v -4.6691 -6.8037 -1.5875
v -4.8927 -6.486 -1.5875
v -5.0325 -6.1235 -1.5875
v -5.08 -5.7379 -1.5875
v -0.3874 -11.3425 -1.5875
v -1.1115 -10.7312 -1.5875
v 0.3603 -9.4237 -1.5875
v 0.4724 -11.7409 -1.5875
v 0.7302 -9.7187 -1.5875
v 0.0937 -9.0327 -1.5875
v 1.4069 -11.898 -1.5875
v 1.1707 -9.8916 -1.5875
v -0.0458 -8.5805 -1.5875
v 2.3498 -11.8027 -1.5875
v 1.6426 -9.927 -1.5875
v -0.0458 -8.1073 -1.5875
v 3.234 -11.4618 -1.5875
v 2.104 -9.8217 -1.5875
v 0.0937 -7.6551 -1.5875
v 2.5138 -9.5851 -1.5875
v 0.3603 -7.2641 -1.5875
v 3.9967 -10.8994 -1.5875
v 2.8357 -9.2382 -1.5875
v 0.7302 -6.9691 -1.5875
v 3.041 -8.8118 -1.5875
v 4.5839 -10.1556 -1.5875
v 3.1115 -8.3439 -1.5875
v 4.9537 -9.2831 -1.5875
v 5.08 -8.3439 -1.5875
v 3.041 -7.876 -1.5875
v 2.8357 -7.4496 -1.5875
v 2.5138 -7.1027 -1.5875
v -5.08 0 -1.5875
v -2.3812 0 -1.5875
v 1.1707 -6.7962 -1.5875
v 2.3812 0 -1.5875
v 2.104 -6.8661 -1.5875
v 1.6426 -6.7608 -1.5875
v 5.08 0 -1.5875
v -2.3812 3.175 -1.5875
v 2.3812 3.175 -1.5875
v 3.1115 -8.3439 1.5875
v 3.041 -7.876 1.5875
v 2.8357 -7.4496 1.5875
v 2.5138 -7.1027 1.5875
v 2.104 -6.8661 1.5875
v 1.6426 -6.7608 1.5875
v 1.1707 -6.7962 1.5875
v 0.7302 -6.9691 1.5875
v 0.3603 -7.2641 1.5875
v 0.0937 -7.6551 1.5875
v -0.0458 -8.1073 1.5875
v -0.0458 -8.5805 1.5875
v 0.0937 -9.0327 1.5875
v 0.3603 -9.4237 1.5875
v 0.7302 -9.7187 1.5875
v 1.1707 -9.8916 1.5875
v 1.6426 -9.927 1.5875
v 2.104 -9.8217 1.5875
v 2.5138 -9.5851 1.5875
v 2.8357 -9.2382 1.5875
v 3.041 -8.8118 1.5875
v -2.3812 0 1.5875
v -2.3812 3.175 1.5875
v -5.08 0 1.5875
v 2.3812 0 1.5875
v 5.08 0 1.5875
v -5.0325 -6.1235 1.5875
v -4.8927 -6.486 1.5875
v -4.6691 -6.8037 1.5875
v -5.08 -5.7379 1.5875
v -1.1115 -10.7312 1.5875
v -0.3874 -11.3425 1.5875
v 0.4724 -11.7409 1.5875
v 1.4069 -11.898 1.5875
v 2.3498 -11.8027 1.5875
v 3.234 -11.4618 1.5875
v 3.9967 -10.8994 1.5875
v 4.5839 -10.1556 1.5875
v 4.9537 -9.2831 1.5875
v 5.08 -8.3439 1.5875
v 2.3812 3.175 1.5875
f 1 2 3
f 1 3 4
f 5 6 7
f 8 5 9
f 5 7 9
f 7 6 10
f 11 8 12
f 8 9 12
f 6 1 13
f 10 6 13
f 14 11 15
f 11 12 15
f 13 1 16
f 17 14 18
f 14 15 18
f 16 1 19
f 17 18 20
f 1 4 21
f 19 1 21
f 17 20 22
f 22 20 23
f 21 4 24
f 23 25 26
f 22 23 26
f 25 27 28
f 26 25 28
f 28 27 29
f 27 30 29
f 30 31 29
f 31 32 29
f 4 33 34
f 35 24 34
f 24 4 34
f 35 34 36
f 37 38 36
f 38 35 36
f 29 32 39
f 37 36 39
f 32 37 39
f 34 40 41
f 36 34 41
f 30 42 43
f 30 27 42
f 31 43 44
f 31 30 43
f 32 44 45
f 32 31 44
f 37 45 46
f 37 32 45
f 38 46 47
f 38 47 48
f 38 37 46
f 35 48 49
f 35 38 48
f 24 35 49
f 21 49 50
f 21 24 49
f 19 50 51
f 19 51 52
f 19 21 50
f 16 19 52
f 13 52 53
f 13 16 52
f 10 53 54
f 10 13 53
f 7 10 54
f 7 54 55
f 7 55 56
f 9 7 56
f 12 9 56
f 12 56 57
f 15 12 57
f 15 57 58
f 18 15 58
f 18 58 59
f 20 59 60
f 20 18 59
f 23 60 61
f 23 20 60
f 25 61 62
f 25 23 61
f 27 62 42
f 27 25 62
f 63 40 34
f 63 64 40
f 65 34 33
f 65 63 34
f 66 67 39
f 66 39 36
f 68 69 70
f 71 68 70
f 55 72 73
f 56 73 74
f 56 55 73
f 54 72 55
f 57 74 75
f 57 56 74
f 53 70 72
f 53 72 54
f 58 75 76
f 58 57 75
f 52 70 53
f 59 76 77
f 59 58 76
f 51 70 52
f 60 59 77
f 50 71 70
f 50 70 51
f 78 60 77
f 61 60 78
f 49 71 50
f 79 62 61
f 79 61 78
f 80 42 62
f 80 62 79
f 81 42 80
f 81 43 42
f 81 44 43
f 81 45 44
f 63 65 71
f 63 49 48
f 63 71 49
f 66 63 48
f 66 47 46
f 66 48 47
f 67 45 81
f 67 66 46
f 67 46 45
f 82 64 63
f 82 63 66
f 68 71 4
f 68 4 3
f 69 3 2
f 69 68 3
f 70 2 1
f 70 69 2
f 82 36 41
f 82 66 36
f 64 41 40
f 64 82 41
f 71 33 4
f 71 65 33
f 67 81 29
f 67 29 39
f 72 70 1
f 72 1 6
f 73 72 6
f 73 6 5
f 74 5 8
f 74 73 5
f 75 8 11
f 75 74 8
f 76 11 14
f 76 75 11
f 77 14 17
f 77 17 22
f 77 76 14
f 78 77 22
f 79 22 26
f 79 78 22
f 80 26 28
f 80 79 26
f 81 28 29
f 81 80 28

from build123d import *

# Parameters (mm, degrees)
SKETCH1_R           = 1.5875
BOSS_EXTRUDE1_DEPTH = 1.5875


with BuildPart() as part:
    # Sketch1 → Boss-Extrude1 (new body, symmetric)
    with BuildSketch(Plane.XY):
        with BuildLine():
            Line((-5.08, 0), (-5.08, -5.737908239))
            ThreePointArc((-5.08, -5.737908239), (-4.973712071, -6.309018604), (-4.669080882, -6.803653836))
            Line((-4.669080882, -6.803653836), (-1.111541176, -10.731170137))
            ThreePointArc((-1.111541176, -10.731170137), (2.803287219, -11.66181504), (5.08, -8.3439))
            Line((5.08, -8.3439), (5.08, 0))
            Line((5.08, 0), (2.38125, 0))
            Line((2.38125, 0), (2.38125, 3.175))
            Line((2.38125, 3.175), (-2.38125, 3.175))
            Line((-2.38125, 3.175), (-2.38125, 0))
            Line((-2.38125, 0), (-5.08, 0))
        make_face()
        with Locations((1.524, -8.3439)):
            Circle(SKETCH1_R, mode=Mode.SUBTRACT)
    extrude(amount=BOSS_EXTRUDE1_DEPTH, both=True)


solid = part.part
